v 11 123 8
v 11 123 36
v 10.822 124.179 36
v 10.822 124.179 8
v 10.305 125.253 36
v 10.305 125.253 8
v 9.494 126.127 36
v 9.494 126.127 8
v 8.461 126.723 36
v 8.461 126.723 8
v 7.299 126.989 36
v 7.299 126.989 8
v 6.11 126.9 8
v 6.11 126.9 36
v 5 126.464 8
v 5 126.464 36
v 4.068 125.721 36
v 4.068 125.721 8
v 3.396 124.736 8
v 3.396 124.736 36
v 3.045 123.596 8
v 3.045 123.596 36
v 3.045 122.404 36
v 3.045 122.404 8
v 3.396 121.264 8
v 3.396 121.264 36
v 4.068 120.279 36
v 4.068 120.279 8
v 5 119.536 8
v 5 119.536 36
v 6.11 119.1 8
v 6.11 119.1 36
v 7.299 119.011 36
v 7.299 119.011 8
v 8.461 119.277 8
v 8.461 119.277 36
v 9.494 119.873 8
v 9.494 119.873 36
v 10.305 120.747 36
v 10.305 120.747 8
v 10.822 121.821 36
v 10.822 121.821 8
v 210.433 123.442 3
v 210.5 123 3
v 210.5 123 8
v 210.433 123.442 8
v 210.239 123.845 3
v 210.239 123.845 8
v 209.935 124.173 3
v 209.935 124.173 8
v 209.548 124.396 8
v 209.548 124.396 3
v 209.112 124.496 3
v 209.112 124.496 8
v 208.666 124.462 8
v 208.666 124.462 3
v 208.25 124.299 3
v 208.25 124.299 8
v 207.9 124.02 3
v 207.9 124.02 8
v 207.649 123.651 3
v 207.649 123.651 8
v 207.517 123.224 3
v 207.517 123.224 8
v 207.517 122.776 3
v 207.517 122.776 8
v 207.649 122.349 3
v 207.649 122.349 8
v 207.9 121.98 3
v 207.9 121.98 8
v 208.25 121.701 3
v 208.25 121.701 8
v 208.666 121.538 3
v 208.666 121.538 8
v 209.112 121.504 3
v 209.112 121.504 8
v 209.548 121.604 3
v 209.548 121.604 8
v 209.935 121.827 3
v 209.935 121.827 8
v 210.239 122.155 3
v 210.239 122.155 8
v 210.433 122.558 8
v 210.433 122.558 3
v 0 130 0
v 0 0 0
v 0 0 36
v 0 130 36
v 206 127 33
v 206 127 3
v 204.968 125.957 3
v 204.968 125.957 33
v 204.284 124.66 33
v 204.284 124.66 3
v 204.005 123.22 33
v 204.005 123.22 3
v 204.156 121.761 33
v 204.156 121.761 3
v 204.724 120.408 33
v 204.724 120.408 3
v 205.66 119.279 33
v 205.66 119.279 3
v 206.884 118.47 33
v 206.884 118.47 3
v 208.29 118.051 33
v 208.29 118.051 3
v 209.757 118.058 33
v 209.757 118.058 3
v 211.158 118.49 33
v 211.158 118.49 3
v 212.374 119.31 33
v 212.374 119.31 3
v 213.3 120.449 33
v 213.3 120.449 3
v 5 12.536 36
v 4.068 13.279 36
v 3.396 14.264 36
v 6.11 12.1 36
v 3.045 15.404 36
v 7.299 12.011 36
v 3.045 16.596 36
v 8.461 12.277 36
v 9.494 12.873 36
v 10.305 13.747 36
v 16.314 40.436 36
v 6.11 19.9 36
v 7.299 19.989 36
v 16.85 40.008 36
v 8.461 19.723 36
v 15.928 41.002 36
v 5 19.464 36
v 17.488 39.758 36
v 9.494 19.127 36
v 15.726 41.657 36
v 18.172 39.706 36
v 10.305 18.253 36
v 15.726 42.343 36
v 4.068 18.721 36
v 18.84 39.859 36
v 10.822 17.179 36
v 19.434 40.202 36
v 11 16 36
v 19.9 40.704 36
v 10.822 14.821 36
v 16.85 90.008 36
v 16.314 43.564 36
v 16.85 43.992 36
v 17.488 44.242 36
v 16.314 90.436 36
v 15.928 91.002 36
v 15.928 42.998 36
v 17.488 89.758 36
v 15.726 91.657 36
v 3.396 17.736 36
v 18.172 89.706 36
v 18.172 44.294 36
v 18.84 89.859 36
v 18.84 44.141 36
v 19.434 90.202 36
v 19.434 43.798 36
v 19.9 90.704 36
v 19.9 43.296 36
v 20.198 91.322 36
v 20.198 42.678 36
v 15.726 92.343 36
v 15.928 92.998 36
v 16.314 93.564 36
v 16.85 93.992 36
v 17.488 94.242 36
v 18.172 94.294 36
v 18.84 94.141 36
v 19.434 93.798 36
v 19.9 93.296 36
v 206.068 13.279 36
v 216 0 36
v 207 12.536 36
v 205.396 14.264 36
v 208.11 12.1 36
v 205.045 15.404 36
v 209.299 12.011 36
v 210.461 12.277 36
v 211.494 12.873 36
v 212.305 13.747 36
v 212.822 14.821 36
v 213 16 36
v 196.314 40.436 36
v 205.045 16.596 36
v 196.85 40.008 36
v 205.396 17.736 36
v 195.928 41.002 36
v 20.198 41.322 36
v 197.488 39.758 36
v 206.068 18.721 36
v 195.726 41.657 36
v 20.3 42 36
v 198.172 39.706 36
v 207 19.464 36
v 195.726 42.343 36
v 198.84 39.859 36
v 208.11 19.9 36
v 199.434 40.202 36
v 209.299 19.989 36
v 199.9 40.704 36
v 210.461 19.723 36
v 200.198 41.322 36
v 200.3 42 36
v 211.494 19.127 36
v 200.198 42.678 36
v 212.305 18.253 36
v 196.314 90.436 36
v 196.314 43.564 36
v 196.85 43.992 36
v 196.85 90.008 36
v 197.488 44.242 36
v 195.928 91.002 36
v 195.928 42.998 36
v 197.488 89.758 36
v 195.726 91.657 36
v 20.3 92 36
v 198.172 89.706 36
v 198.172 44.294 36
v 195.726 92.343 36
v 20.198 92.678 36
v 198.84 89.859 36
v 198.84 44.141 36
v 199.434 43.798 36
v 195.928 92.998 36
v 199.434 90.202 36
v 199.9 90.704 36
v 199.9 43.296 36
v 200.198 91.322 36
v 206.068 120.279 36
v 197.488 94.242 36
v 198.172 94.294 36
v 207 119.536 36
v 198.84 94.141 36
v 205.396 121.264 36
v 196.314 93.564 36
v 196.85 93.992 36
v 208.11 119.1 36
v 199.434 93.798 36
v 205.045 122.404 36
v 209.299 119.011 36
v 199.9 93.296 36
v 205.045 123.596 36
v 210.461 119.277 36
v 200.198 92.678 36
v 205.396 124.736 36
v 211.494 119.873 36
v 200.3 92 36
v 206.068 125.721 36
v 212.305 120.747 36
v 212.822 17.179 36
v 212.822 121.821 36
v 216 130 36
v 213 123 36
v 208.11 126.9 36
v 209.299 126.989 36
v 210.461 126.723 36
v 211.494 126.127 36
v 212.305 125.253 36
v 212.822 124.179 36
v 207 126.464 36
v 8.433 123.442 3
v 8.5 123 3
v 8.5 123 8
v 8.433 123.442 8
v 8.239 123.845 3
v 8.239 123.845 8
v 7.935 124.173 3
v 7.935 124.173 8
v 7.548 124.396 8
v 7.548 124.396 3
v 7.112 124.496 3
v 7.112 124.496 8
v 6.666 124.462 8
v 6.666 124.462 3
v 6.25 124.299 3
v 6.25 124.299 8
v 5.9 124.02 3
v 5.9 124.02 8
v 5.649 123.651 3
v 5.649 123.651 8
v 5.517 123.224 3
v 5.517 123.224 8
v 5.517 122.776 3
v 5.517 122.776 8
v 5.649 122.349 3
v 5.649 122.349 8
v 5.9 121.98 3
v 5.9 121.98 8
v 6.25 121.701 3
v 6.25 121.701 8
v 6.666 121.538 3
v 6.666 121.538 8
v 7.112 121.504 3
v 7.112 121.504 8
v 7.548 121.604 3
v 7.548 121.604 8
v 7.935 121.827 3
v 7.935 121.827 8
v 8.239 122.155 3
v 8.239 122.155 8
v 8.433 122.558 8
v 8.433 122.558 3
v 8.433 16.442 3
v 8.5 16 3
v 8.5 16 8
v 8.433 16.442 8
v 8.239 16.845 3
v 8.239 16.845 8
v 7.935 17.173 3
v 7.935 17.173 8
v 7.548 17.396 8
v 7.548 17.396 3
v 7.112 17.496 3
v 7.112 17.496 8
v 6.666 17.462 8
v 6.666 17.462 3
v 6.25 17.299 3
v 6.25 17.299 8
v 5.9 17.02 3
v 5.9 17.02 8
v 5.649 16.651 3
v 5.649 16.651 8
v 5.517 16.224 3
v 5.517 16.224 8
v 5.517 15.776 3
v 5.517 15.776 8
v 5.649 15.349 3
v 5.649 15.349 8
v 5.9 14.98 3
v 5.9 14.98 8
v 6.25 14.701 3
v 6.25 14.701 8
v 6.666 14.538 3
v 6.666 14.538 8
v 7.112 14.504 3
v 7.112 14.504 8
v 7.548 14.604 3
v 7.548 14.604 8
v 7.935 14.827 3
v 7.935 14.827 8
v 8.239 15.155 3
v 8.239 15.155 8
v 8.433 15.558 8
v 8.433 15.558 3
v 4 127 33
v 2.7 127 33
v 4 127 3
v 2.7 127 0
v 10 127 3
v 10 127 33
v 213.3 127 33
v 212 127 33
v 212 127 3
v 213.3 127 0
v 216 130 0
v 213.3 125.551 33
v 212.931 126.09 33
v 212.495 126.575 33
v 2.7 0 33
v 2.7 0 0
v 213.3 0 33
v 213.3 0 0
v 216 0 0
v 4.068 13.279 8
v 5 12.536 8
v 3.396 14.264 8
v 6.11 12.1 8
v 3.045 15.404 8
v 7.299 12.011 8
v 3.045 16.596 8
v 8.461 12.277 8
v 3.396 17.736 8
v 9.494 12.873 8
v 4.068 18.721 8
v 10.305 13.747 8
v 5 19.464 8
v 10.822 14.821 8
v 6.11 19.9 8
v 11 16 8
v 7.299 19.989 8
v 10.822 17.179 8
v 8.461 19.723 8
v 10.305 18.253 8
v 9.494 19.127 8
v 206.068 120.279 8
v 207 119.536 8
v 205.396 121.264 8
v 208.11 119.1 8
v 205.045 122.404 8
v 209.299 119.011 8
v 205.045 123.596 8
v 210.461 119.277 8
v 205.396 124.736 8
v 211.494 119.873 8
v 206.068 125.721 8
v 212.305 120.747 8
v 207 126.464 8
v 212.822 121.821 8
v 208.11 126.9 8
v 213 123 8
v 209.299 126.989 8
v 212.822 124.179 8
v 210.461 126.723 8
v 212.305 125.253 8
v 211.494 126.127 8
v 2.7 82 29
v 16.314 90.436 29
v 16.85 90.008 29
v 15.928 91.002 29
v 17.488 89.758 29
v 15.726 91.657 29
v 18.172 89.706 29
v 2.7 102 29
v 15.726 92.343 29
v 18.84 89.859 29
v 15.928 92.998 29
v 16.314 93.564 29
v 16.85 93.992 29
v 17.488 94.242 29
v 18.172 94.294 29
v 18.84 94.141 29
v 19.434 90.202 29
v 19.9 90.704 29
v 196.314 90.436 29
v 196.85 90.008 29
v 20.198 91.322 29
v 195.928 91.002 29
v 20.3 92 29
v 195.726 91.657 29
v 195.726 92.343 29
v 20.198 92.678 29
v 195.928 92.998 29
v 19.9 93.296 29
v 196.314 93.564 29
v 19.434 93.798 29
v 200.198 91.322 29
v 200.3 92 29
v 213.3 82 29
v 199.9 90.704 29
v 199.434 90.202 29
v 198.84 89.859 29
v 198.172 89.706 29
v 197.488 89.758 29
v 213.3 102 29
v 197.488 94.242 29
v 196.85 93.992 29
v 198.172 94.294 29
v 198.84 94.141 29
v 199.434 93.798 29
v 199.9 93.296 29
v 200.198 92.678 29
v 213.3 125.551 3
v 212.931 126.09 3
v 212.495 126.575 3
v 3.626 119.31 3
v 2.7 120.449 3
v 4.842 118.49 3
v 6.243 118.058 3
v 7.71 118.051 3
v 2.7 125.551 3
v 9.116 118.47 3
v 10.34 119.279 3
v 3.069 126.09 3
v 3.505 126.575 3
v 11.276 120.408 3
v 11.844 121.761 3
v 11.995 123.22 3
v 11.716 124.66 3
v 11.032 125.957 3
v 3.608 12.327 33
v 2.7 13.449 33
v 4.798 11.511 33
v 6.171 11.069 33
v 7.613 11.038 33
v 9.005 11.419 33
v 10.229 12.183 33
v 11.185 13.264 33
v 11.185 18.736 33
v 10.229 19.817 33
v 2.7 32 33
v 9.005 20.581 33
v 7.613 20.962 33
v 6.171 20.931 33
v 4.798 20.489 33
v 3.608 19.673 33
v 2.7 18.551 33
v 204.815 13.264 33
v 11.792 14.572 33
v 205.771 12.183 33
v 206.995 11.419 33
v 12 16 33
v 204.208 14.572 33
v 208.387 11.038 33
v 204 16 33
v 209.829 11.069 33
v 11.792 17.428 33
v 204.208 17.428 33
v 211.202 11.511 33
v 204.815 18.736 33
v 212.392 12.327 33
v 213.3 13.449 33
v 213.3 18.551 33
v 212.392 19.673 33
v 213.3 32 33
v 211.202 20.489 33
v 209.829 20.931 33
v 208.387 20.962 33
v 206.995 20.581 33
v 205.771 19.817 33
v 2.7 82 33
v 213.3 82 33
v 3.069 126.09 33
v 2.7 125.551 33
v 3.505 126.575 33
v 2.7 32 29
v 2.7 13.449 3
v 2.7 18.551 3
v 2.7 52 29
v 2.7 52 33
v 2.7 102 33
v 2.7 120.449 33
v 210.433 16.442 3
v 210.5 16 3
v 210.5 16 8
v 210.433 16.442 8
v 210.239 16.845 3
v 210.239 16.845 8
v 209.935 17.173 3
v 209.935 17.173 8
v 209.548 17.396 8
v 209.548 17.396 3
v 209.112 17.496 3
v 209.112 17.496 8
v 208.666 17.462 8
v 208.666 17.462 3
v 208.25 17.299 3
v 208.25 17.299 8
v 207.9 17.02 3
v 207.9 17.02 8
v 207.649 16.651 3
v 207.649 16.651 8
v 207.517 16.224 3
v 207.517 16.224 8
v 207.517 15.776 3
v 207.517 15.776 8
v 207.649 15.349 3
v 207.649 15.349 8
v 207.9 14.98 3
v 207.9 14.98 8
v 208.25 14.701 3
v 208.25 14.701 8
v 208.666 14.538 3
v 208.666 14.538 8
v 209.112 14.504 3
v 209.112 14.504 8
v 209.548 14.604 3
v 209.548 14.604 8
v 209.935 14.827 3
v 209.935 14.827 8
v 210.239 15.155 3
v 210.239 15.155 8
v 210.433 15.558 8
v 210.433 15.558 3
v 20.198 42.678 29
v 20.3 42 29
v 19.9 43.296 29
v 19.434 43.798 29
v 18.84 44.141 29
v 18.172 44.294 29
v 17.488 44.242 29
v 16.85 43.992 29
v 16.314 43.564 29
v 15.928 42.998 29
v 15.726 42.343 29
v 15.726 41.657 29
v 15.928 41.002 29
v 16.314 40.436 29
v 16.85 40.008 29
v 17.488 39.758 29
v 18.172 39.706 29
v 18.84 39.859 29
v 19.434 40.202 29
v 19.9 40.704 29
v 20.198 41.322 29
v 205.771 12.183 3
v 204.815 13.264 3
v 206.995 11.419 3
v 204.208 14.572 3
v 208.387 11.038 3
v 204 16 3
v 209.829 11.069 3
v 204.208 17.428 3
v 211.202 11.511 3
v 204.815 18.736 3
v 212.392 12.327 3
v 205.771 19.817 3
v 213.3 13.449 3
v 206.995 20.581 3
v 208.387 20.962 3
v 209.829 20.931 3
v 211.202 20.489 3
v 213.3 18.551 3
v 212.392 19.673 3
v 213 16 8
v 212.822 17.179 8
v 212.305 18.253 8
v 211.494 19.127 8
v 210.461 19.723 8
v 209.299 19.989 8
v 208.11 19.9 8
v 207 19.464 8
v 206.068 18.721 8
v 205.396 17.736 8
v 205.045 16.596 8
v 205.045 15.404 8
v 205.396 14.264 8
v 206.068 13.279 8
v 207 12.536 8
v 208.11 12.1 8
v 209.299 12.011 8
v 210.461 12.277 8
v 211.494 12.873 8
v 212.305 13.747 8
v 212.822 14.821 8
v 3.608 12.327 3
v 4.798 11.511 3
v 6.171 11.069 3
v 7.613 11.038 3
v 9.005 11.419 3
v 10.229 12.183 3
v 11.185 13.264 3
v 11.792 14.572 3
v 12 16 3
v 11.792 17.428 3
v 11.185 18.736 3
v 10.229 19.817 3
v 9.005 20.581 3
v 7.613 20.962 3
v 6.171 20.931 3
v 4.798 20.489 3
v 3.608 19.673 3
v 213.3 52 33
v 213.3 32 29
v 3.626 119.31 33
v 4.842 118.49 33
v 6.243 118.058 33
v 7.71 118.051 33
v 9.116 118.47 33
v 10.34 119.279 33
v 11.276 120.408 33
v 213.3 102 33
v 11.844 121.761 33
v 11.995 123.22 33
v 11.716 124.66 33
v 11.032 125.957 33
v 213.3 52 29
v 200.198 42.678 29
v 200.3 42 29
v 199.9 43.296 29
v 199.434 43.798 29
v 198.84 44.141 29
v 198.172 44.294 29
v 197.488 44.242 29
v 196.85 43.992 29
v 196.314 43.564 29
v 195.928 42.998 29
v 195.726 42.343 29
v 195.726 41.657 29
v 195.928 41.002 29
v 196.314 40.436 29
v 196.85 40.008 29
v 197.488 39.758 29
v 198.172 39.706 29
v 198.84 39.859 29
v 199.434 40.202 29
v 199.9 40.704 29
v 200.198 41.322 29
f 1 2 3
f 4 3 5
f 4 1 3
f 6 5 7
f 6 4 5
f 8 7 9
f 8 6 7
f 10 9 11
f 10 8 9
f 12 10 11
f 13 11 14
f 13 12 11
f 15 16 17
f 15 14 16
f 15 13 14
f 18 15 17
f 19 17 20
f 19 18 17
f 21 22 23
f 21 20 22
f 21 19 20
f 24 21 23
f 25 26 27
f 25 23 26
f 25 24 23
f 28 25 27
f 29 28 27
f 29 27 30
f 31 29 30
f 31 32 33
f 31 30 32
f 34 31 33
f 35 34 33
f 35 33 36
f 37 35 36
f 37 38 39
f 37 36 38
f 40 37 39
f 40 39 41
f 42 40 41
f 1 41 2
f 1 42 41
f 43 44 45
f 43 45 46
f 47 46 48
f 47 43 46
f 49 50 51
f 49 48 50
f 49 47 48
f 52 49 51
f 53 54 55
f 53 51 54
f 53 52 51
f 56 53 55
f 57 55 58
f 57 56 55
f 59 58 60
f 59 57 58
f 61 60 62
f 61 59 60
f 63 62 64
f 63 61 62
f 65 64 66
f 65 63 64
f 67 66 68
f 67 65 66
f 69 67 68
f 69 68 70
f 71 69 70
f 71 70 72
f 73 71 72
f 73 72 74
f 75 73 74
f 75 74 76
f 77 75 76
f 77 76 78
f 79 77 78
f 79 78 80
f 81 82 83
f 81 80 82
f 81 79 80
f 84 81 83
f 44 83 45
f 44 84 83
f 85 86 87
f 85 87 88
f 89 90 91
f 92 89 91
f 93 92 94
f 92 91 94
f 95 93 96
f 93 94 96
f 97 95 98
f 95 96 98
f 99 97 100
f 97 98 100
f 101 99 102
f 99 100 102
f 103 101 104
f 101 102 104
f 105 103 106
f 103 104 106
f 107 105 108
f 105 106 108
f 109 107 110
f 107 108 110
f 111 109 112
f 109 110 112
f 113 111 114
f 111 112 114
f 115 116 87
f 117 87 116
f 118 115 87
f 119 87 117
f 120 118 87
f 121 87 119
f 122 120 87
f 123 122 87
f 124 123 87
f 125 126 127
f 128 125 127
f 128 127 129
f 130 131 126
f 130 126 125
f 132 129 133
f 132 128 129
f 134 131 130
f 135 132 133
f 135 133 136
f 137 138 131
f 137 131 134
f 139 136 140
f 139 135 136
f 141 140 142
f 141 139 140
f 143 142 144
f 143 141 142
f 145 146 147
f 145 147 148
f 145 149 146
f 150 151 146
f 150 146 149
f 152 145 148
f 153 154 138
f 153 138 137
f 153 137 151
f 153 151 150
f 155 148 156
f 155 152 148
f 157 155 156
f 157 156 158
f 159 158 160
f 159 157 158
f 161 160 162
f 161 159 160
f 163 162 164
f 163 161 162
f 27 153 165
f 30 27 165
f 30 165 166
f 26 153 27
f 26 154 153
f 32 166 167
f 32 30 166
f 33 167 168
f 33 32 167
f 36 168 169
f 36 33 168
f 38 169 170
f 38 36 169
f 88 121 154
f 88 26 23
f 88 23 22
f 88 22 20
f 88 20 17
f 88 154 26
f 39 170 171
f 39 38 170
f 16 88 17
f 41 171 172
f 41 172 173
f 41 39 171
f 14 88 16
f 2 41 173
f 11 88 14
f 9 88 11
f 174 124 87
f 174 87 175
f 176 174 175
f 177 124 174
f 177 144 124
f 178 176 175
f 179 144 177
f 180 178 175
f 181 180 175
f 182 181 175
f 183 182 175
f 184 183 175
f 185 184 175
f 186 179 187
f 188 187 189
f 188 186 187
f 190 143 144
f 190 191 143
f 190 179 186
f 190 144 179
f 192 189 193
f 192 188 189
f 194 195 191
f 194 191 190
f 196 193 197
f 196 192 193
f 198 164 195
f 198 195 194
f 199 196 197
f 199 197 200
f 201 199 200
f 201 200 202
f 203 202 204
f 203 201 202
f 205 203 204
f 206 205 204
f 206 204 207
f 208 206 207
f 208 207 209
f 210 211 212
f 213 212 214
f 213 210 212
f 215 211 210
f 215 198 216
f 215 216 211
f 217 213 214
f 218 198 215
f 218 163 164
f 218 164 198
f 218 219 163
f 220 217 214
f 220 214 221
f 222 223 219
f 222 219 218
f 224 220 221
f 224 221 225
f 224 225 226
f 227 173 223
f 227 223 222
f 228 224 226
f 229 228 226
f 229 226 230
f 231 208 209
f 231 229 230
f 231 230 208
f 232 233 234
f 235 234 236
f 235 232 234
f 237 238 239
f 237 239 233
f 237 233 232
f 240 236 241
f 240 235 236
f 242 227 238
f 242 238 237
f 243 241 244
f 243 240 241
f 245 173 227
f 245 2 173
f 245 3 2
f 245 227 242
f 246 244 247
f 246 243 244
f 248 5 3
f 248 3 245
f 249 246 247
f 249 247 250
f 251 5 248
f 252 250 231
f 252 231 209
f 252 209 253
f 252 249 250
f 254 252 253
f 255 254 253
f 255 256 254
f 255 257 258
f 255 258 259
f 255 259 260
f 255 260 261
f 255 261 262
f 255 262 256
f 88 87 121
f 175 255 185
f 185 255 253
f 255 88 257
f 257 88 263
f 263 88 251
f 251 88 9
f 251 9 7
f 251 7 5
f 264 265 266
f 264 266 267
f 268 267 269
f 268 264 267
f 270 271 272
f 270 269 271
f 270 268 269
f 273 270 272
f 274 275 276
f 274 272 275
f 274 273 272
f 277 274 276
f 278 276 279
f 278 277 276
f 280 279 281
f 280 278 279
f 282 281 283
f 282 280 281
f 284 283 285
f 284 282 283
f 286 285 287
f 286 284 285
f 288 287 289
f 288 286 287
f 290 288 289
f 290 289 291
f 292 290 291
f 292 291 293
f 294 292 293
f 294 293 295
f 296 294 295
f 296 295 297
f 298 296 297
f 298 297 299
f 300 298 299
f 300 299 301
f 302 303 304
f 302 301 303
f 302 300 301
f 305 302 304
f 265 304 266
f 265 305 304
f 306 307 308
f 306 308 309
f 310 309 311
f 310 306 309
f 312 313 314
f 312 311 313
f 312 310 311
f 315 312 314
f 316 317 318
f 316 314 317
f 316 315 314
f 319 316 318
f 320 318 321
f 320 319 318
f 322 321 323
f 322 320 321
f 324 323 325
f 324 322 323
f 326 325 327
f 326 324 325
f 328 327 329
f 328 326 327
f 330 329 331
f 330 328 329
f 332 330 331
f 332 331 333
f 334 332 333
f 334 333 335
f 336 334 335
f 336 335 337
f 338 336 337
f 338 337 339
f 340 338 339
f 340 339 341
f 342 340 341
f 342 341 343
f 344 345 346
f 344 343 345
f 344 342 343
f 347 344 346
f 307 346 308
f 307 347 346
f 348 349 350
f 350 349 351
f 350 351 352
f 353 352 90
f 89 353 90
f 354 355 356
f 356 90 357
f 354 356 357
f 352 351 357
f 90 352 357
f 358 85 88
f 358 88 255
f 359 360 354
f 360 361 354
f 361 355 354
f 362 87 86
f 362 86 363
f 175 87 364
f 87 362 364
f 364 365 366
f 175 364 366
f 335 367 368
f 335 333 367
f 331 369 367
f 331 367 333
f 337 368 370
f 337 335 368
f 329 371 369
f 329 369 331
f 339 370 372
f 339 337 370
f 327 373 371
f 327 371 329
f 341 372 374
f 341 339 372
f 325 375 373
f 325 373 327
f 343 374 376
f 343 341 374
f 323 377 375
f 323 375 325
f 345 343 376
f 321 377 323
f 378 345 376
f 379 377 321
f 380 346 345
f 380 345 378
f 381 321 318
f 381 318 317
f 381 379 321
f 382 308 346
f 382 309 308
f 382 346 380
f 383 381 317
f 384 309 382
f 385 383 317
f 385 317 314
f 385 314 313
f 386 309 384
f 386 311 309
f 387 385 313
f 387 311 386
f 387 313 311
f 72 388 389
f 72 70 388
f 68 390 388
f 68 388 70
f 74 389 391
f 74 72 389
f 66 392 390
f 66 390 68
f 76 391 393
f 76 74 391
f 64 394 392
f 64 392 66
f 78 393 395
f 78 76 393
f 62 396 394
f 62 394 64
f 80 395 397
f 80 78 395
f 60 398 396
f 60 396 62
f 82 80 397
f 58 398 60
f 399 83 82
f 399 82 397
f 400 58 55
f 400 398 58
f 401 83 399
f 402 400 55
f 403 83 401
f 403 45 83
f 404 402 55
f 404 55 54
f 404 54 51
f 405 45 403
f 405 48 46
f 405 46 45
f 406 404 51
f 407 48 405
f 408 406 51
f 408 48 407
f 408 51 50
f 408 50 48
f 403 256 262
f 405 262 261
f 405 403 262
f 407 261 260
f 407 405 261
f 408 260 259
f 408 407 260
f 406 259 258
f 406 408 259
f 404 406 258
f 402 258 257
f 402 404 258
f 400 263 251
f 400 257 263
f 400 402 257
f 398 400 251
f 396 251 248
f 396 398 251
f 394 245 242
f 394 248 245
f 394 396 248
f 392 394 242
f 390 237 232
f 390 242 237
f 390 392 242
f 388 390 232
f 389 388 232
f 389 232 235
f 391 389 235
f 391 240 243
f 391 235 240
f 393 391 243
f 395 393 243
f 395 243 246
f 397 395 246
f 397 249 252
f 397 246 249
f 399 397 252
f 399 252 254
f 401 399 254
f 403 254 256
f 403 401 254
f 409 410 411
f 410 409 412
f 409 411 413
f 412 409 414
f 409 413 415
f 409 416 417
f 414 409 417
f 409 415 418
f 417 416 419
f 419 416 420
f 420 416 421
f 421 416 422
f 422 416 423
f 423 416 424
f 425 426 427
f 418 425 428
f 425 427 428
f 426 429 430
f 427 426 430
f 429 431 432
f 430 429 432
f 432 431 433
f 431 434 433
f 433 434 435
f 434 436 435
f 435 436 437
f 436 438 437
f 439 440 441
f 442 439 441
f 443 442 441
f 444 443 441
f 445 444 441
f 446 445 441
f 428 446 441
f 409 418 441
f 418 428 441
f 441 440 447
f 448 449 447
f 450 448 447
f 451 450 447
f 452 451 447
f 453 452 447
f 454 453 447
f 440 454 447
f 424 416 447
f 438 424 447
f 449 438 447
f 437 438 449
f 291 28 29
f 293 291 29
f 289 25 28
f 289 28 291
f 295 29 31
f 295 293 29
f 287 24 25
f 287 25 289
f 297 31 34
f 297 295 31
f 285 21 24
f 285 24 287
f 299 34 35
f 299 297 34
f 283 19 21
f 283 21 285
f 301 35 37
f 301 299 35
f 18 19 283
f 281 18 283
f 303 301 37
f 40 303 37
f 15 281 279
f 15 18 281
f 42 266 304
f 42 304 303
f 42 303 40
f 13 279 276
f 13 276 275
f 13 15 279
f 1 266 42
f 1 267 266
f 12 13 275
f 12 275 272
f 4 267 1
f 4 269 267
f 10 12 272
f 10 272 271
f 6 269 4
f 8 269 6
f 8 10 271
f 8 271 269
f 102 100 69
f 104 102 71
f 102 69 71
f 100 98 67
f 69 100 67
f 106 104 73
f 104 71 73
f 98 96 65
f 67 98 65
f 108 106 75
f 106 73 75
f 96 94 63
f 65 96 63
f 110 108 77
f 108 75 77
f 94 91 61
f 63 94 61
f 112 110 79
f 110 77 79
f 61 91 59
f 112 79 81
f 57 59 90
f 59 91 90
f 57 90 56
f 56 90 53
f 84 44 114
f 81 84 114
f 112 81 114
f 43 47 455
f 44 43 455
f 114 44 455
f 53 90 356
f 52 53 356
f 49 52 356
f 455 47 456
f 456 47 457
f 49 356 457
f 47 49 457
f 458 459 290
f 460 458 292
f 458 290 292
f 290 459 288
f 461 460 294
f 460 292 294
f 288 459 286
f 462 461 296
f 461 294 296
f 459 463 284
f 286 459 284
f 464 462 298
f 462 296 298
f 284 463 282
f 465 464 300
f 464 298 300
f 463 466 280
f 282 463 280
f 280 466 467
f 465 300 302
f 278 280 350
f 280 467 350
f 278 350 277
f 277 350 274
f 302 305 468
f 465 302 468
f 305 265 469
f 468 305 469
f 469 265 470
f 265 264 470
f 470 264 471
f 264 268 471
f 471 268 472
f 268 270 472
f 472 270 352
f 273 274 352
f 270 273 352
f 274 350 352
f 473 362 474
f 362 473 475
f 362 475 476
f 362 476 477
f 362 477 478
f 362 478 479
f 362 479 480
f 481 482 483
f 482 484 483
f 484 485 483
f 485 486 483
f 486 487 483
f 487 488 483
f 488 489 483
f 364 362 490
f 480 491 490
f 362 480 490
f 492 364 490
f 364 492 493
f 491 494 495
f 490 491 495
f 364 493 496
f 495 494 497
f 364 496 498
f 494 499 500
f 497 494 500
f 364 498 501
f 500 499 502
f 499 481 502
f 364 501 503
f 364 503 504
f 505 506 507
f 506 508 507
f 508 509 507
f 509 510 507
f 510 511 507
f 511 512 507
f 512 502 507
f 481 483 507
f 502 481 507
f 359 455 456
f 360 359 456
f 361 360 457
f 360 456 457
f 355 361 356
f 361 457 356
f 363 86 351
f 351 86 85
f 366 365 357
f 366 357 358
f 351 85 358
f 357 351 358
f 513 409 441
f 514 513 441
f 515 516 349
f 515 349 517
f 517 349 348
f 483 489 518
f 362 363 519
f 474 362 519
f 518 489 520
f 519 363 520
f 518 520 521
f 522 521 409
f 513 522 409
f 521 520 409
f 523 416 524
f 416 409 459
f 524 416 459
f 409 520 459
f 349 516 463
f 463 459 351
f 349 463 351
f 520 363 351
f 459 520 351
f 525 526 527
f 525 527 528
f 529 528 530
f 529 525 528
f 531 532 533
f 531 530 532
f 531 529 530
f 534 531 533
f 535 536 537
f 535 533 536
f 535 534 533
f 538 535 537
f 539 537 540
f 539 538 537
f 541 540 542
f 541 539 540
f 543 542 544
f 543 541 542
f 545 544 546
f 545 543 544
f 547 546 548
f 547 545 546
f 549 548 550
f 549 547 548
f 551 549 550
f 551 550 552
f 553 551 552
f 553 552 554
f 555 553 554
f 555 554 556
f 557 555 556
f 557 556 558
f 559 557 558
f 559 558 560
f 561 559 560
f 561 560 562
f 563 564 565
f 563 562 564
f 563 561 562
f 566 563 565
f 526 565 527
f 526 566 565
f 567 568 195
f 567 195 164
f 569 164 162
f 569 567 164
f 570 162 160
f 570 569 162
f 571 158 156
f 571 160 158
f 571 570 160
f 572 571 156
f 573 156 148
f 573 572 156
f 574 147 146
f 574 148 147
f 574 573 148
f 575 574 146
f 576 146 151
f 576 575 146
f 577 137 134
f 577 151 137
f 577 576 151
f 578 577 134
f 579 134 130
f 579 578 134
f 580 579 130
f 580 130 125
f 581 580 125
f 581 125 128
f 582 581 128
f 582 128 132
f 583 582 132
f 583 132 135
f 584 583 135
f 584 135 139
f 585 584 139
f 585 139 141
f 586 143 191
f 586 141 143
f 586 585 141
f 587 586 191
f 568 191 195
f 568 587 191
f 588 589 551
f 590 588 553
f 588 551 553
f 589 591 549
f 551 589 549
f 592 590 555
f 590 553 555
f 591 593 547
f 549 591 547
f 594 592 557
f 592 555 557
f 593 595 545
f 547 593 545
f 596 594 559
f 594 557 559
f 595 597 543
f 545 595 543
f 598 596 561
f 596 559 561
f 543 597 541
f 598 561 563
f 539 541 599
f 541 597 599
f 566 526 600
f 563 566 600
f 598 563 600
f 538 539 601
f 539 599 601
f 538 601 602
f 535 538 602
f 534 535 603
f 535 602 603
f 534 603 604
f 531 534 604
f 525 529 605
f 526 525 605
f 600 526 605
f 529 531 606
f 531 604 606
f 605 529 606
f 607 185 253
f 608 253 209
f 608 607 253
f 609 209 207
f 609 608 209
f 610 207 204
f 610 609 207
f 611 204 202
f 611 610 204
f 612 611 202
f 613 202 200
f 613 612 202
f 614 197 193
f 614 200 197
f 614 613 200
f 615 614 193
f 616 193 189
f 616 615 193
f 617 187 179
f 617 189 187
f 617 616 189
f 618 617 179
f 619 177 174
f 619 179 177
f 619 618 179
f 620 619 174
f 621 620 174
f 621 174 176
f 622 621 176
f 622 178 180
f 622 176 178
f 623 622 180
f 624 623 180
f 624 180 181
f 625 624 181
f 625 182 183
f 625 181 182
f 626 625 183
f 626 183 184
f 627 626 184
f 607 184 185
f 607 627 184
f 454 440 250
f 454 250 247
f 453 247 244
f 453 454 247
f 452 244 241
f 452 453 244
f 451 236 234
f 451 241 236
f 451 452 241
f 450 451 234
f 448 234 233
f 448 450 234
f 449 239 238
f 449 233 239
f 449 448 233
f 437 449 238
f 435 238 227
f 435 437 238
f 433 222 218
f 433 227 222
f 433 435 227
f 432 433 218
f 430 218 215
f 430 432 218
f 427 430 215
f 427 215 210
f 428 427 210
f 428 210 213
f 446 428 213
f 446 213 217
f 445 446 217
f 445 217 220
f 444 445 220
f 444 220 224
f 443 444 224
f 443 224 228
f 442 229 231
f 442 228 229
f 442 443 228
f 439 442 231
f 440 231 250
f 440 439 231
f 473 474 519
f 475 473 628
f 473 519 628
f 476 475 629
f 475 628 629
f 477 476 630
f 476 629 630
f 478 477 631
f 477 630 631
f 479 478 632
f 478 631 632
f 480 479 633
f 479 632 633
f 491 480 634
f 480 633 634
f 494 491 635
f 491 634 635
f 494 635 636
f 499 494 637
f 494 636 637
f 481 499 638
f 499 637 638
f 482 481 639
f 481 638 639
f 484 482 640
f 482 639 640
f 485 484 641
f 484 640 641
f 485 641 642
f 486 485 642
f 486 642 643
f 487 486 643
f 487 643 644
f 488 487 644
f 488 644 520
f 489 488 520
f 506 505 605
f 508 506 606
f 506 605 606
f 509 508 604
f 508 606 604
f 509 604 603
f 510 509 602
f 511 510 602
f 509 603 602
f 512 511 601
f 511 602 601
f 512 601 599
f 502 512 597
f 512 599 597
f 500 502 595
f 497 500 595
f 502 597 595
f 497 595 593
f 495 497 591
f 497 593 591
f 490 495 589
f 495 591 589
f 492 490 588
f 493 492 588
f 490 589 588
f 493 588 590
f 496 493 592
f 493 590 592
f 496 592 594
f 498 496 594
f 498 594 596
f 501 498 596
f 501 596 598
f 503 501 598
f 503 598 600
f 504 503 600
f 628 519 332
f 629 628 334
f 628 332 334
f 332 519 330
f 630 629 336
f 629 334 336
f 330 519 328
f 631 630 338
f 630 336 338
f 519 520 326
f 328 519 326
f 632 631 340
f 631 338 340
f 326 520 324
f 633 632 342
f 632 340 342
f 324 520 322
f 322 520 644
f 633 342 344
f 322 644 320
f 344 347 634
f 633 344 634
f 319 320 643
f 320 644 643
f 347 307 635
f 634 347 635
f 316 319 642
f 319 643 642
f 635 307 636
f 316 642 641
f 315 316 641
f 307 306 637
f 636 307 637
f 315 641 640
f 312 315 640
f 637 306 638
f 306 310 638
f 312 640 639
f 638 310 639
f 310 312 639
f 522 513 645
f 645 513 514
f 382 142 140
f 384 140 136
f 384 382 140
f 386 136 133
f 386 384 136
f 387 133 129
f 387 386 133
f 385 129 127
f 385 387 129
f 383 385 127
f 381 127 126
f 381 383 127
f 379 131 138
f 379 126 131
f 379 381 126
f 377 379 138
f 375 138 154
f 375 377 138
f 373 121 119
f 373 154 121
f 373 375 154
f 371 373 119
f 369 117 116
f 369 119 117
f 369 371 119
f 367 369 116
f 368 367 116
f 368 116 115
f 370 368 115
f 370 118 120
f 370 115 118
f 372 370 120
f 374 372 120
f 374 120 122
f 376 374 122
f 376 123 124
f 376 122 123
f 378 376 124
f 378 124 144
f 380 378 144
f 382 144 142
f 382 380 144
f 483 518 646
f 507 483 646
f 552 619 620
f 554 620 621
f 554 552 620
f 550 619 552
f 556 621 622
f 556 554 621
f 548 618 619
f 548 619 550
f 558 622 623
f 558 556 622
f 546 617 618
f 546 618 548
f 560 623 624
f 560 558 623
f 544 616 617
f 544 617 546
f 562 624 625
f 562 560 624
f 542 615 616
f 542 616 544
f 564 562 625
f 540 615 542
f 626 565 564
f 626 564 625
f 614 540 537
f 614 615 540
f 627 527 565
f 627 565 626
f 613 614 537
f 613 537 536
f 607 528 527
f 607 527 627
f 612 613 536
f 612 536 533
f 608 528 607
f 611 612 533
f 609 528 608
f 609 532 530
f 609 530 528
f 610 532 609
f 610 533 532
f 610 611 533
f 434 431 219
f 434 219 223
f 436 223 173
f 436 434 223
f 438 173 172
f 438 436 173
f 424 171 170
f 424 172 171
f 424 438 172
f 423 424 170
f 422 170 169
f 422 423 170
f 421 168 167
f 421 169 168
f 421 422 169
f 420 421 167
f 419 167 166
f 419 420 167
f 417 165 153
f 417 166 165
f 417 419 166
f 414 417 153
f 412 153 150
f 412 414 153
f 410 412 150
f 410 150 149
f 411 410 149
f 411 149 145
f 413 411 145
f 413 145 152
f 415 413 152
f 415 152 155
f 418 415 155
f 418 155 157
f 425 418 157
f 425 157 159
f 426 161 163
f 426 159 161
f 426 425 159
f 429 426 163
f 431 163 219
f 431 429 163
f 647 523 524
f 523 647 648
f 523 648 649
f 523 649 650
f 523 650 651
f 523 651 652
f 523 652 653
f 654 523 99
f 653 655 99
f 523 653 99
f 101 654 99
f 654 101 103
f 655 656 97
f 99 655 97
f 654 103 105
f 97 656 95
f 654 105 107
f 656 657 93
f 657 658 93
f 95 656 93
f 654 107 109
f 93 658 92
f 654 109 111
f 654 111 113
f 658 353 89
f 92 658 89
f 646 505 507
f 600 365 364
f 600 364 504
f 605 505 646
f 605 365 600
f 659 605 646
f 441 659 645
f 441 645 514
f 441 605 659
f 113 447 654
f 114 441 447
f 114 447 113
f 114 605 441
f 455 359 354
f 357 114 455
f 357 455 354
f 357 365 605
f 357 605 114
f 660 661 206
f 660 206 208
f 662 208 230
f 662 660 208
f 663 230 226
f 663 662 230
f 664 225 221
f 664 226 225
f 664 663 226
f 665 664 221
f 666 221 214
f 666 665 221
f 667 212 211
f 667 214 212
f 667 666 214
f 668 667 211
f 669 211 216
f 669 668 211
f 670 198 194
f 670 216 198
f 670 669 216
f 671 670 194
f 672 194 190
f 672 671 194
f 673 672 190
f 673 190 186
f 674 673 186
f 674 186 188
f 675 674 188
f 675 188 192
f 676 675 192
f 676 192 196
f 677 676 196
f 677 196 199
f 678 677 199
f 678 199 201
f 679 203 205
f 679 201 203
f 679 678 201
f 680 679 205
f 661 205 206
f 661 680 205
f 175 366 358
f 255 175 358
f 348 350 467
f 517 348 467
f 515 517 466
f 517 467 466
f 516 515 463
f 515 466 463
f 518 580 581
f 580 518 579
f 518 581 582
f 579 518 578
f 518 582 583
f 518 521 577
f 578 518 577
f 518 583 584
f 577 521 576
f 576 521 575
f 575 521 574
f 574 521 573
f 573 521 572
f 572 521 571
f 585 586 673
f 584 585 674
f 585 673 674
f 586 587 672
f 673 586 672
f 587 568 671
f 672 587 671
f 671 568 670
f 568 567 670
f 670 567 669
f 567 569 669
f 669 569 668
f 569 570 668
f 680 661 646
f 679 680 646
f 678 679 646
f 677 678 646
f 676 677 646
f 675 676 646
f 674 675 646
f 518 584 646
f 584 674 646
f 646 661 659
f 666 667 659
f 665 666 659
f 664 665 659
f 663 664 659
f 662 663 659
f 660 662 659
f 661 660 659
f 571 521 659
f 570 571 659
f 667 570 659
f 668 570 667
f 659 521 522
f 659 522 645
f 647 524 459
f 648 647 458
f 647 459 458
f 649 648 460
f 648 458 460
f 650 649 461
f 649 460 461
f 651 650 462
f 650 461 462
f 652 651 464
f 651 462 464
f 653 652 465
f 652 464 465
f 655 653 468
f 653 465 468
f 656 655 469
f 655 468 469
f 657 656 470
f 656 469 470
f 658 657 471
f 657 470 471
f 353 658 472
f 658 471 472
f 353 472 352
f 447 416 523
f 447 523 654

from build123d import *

# Parameters (mm, degrees)
SKETCH006_R  = 2.3
PAD006_DEPTH = 100
SKETCH005_W  = 216
SKETCH005_H  = 20
PAD005_DEPTH = 4
SKETCH004_R  = 4
PAD004_DEPTH = 50
SKETCH003_R  = 1.5
PAD003_DEPTH = 100
SKETCH002_R  = 5
PAD002_DEPTH = 30
SKETCH001_W  = 210.6
SKETCH001_H  = 127
PAD001_DEPTH = 33
SKETCH_W     = 216
SKETCH_H     = 130
PAD_DEPTH    = 36


with BuildPart() as sensor_head_mount_holes:
    # Sketch006 → Pad006 (new body)
    with BuildSketch(Plane.XY):
        with Locations((18, 42)):
            Circle(SKETCH006_R)
        with Locations((198, 42)):
            Circle(SKETCH006_R)
        with Locations((18, 92)):
            Circle(SKETCH006_R)
        with Locations((198, 92)):
            Circle(SKETCH006_R)
    extrude(amount=PAD006_DEPTH)


with BuildPart() as crossbeams:
    # Sketch005 → Pad005 (new body)
    with BuildSketch(Plane.XY.offset(29)):
        with Locations((108, 92)):
            Rectangle(SKETCH005_W, SKETCH005_H)
        with Locations((108, 42)):
            Rectangle(SKETCH005_W, SKETCH005_H)
    extrude(amount=PAD005_DEPTH)


with BuildPart() as screw_recesses:
    # Sketch004 → Pad004 (new body)
    with BuildSketch(Plane.XY.offset(8)):
        with Locations((7, 123)):
            Circle(SKETCH004_R)
        with Locations((7, 16)):
            Circle(SKETCH004_R)
        with Locations((209, 123)):
            Circle(SKETCH004_R)
        with Locations((209, 16)):
            Circle(SKETCH004_R)
    extrude(amount=PAD004_DEPTH)


with BuildPart() as screw_holes:
    # Sketch003 → Pad003 (new body)
    with BuildSketch(Plane.XY):
        with Locations((7, 123)):
            Circle(SKETCH003_R)
        with Locations((7, 16)):
            Circle(SKETCH003_R)
        with Locations((209, 123)):
            Circle(SKETCH003_R)
        with Locations((209, 16)):
            Circle(SKETCH003_R)
    extrude(amount=PAD003_DEPTH)


with BuildPart() as pylons:
    # Sketch002 → Pad002 (new body)
    with BuildSketch(Plane.XY.offset(3)):
        with Locations((7, 123)):
            Circle(SKETCH002_R)
        with Locations((7, 16)):
            Circle(SKETCH002_R)
        with Locations((209, 123)):
            Circle(SKETCH002_R)
        with Locations((209, 16)):
            Circle(SKETCH002_R)
    extrude(amount=PAD002_DEPTH)


with BuildPart() as interior_hole:
    # Sketch001 → Pad001 (new body)
    with BuildSketch(Plane.XY):
        with Locations((108, 63.5)):
            Rectangle(SKETCH001_W, SKETCH001_H)
    extrude(amount=PAD001_DEPTH)


with BuildPart() as cut003:
    # Sketch → Pad (new body)
    with BuildSketch(Plane.XY):
        with Locations((108, 65)):
            Rectangle(SKETCH_W, SKETCH_H)
    extrude(amount=PAD_DEPTH)

    # Cut: cut Interior Hole
    add(interior_hole.part, mode=Mode.SUBTRACT)

    # Fusion: union Pylons
    add(pylons.part)

    # Cut001: cut Screw Holes
    add(screw_holes.part, mode=Mode.SUBTRACT)

    # Cut002: cut Screw Recesses
    add(screw_recesses.part, mode=Mode.SUBTRACT)

    # Fusion001: union Crossbeams
    add(crossbeams.part)

    # Cut003: cut Sensor Head Mount Holes
    add(sensor_head_mount_holes.part, mode=Mode.SUBTRACT)


solid = cut003.part
